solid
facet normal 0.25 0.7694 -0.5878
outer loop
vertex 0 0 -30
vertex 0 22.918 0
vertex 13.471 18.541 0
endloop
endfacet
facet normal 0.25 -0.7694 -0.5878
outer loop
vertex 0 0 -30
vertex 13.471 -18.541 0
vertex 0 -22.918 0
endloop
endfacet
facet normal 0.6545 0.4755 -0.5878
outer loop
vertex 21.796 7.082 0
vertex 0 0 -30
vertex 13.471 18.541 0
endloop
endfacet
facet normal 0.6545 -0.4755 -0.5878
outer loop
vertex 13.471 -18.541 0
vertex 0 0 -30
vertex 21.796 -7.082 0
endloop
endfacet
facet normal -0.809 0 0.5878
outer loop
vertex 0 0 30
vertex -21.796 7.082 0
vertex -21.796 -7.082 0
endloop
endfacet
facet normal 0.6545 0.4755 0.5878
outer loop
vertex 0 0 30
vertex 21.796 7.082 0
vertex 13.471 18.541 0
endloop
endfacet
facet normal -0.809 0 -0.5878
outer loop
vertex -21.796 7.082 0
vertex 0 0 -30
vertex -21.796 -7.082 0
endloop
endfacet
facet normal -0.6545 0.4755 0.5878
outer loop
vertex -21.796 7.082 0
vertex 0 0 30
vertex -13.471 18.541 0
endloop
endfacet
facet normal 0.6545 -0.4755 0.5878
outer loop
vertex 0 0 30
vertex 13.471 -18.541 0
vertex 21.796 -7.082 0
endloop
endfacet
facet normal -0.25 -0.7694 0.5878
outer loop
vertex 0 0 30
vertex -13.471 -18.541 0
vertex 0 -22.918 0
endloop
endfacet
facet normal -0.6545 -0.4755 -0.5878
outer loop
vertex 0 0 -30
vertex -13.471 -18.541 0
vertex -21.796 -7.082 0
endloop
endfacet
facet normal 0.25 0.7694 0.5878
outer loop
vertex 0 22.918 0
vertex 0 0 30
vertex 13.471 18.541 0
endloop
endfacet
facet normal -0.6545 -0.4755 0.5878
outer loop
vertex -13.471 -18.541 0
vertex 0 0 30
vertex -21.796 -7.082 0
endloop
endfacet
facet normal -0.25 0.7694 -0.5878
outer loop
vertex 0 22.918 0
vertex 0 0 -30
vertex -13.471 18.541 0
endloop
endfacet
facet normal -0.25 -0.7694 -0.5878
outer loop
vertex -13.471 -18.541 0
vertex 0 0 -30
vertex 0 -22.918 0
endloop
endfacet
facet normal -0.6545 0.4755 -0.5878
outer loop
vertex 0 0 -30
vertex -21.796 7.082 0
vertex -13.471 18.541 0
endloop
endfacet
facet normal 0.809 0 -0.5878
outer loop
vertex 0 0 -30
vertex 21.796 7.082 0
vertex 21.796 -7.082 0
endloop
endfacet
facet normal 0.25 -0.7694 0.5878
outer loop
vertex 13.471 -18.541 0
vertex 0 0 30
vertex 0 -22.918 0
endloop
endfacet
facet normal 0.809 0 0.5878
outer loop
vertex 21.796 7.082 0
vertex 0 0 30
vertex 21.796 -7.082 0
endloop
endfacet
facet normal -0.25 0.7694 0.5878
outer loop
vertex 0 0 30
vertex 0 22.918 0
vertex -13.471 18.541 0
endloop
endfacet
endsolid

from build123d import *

# Parameters (mm, degrees)
F1_DEPTH  = 30
F7_DEPTH  = 67.083039
F8_DEPTH  = 67.083039
F9_DEPTH  = 62.189471
F10_DEPTH = 58.648451
F11_DEPTH = 61.353549


with BuildPart() as f1:
    # F0 (on Top) → F1 (new body, symmetric)
    with BuildSketch(Plane.XY):
        Polygon((21.796276, 30), (-21.796276, 30), (-35.267115, -11.45898), (0, -37.082039), (35.267115, -11.45898), align=None)
    extrude(amount=F1_DEPTH, both=True)

    # F2 (on face) → F7 (intersect, through all)
    with BuildSketch(Plane(origin=(0, 30, 0), x_dir=(-1, 0, 0), z_dir=(0, 1, 0))):
        Polygon((21.796276, 0), (0, 30), (-21.796276, 0), (0, -30), align=None)
    extrude(amount=-F7_DEPTH, mode=Mode.INTERSECT)

    # F3 (on face) → F8 (intersect, through all)
    with BuildSketch(Plane(origin=(-17.633558, -24.27051, 0), x_dir=(0.809017, -0.587785, 0), z_dir=(-0.587785, -0.809017, 0))):
        Polygon((0, 30), (-21.796276, 0), (0, -30), (21.796276, 0), align=None)
    extrude(amount=-F8_DEPTH, mode=Mode.INTERSECT)

    # F4 (on face) → F9 (intersect, through all)
    with BuildSketch(Plane(origin=(-28.531695, 9.27051, 0), x_dir=(-0.309017, -0.951057, 0), z_dir=(-0.951057, 0.309017, 0))):
        Polygon((0, -30), (21.796276, 0), (0, 30), (-21.796276, 0), align=None)
    extrude(amount=-F9_DEPTH, mode=Mode.INTERSECT)

    # F5 (on face) → F10 (intersect, through all)
    with BuildSketch(Plane(origin=(28.531695, 9.27051, 0), x_dir=(-0.309017, 0.951057, 0), z_dir=(0.951057, 0.309017, 0))):
        Polygon((0, -30), (21.796276, 0), (0, 30), (-21.796276, 0), align=None)
    extrude(amount=-F10_DEPTH, mode=Mode.INTERSECT)

    # F6 (on face) → F11 (intersect, through all)
    with BuildSketch(Plane(origin=(17.633558, -24.27051, 0), x_dir=(0.809017, 0.587785, 0), z_dir=(0.587785, -0.809017, 0))):
        Polygon((0, -30), (21.796276, 0), (0, 30), (-21.796276, 0), align=None)
    extrude(amount=-F11_DEPTH, mode=Mode.INTERSECT)


solid = f1.part
